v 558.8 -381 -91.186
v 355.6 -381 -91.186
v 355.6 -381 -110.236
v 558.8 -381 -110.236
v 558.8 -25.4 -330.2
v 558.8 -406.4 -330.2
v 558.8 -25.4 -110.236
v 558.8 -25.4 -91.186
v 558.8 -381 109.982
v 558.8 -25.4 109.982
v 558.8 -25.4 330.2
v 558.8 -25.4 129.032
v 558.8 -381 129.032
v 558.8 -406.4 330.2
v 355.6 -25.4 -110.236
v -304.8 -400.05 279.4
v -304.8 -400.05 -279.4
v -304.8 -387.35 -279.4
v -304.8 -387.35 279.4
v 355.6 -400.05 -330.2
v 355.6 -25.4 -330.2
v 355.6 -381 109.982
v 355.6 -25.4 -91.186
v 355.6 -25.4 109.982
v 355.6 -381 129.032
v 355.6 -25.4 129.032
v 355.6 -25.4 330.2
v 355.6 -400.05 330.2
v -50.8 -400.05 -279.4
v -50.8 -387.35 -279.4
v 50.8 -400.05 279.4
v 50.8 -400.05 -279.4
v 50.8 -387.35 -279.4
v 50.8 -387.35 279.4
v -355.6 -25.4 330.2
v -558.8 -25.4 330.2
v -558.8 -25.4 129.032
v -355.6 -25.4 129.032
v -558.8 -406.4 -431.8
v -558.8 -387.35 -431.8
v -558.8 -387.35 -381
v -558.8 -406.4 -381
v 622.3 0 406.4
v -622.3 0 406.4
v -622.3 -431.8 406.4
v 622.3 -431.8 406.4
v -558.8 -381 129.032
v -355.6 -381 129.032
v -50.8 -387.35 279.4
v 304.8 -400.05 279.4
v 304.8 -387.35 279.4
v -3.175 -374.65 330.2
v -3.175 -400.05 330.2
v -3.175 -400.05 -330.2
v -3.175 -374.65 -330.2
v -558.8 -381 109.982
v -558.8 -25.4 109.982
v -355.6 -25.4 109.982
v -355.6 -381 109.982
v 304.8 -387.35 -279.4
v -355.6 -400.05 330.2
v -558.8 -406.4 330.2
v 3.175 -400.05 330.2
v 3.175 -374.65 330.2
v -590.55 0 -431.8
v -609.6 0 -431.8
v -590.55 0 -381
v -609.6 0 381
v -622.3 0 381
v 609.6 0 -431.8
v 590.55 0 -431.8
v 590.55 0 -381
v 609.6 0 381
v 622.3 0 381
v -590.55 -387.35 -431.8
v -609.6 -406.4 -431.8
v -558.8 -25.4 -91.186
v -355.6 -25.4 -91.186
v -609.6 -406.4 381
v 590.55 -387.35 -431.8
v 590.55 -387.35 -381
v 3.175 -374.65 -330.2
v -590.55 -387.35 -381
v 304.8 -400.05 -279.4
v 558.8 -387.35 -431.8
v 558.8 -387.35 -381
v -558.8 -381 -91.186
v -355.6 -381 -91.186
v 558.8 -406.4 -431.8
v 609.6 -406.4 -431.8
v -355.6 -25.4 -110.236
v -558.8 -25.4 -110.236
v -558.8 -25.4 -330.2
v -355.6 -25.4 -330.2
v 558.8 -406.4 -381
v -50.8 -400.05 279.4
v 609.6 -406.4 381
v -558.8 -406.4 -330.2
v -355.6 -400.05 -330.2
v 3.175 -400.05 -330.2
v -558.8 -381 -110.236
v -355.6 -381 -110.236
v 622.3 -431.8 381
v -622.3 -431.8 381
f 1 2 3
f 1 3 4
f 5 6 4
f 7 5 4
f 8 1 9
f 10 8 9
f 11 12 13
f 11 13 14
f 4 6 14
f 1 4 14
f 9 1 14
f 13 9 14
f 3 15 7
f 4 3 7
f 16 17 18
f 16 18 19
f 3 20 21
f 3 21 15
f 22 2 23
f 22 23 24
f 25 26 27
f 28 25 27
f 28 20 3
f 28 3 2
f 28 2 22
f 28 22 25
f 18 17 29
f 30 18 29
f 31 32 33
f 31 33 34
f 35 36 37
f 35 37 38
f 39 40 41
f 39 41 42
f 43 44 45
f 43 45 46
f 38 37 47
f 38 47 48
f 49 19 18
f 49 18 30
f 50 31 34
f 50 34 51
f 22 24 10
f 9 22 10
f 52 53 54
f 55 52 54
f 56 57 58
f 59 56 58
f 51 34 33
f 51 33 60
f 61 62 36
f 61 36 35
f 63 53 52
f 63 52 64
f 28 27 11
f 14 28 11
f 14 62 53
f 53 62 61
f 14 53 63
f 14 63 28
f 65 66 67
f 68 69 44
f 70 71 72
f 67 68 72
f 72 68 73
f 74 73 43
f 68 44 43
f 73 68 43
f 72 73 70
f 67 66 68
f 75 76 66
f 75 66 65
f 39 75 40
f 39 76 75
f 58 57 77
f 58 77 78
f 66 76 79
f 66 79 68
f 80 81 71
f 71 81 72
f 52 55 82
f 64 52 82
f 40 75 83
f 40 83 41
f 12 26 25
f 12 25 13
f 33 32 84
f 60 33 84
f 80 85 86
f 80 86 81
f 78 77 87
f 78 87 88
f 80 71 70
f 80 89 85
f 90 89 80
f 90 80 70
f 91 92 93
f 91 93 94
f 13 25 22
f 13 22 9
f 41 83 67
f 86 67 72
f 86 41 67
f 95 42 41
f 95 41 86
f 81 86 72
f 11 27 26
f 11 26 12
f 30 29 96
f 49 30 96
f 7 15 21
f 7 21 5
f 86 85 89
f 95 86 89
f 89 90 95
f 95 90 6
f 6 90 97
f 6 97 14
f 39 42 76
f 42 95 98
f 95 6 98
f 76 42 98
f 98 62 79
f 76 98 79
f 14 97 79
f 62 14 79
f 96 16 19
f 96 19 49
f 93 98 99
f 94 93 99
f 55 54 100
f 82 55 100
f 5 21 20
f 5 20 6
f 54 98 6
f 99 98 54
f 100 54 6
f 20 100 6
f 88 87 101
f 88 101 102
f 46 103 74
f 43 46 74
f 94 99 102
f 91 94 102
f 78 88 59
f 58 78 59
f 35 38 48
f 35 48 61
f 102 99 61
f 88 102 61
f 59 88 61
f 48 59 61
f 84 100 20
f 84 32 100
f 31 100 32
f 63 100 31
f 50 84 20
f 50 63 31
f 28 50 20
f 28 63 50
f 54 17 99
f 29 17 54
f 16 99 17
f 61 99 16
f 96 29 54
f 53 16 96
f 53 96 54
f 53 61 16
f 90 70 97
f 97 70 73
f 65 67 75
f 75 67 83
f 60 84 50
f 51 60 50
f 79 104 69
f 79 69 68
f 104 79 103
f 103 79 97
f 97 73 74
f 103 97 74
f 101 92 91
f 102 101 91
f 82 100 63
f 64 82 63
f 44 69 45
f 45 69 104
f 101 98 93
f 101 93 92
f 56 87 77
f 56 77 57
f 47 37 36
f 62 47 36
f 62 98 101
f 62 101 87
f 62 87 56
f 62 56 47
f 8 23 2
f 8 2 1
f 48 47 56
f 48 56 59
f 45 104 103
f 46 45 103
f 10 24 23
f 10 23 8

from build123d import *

# Parameters (mm, degrees)
F0_W      = 1219.2
F0_H      = 762
F1_DEPTH  = 406.4
F2_W      = 38.1
F2_H      = 38.1
F3_DEPTH  = 50.8
F4_W      = 1219.2
F4_H      = 406.4
F5_DEPTH  = 25.4
F7_DEPTH  = 6.35
F6_W      = 203.2
F6_H      = 660.4
F8_DEPTH  = 381
F9_W      = 254
F9_H      = 558.8
F10_DEPTH = 12.7
F9_W_2    = 3.175
F11_DEPTH = 25.4
F12_W     = 203.2
F12_H     = 19.05
F13_DEPTH = 355.6
F14_DEPTH = 50.8
F15_W     = 19.05
F15_H     = 19.05
F15_H_2   = 387.35
F15_W_2   = 31.75
F16_DEPTH = 50.8


with BuildPart() as f1:
    # F0 (on Front) → F1 (new body)
    with BuildSketch(Plane.XZ):
        Rectangle(F0_W, F0_H)
    extrude(amount=F1_DEPTH)

    # F2 (on face) → F3 (join)
    with BuildSketch(Plane(origin=(0, 0, -381), x_dir=(1, 0, 0), z_dir=(0, 0, -1))):
        with Locations((-590.55, 387.35)):
            Rectangle(F2_W, F2_H)
        with Locations((-590.55, 19.05)):
            Rectangle(F2_W, F2_H)
        with Locations((590.55, 387.35)):
            Rectangle(F2_W, F2_H)
        with Locations((590.55, 19.05)):
            Rectangle(F2_W, F2_H)
    extrude(amount=F3_DEPTH)

    # F4 (on face) → F5 (join)
    with BuildSketch(Plane.XY.offset(381)):
        with Locations((0, -203.2)):
            Rectangle(F4_W, F4_H)
        Polygon((-609.6, -406.4), (-609.6, 0), (-622.3, 0), (-622.3, -406.4), (-622.3, -431.8), (622.3, -431.8), (622.3, 0), (609.6, 0), (609.6, -406.4), align=None)
    extrude(amount=F5_DEPTH)

    # F6 (on face) → F7 (cut)
    with BuildSketch(Plane.XZ.offset(406.4)):
        Polygon((-101.6, 330.2), (-355.6, 330.2), (-355.6, -330.2), (0, -330.2), (0, 0), (0, 330.2), align=None)
        Polygon((355.6, 330.2), (0, 330.2), (0, 0), (0, -330.2), (355.6, -330.2), align=None)
    extrude(amount=-F7_DEPTH, mode=Mode.SUBTRACT)

    # F6 (on face) → F8 (cut)
    with BuildSketch(Plane.XZ.offset(406.4)):
        with Locations((-457.2, 0)):
            Rectangle(F6_W, F6_H)
        with Locations((457.2, 0)):
            Rectangle(F6_W, F6_H)
    extrude(amount=-F8_DEPTH, mode=Mode.SUBTRACT)

    # F9 (on face) → F10 (cut)
    with BuildSketch(Plane.XZ.offset(400.05)):
        with Locations((-177.8, 0)):
            Rectangle(F9_W, F9_H)
        with Locations((177.8, 0)):
            Rectangle(F9_W, F9_H)
    extrude(amount=-F10_DEPTH, mode=Mode.SUBTRACT)

    # F9 (on face) → F11 (cut)
    with BuildSketch(Plane.XZ.offset(400.05)):
        with Locations((1.5875, 0)):
            Rectangle(F9_W_2, F9_H)
        with Locations((-1.5875, 0)):
            Rectangle(F9_W_2, F9_H)
        Polygon((-3.175, -279.4), (-3.175, -330.2), (3.175, -330.2), (3.175, -279.4), (0, -279.4), align=None)
        Polygon((-3.175, 330.2), (-3.175, 279.4), (0, 279.4), (3.175, 279.4), (3.175, 330.2), align=None)
    extrude(amount=-F11_DEPTH, mode=Mode.SUBTRACT)

    # F12 (on face) → F13 (join)
    with BuildSketch(Plane.XZ.offset(25.4)):
        with Locations((-457.2, 119.507)):
            Rectangle(F12_W, F12_H)
        with Locations((-457.2, -100.711)):
            Rectangle(F12_W, F12_H)
        with Locations((457.2, -100.711)):
            Rectangle(F12_W, F12_H)
        with Locations((457.2, 119.507)):
            Rectangle(F12_W, F12_H)
    extrude(amount=F13_DEPTH)

    # F14 (cut): faces of the model
    f14_faces = [f1.faces().sort_by_distance(p)[0] for p in [
        (-590.55, -387.35, -431.8),
        (590.55, -387.35, -431.8),
        (590.55, -19.05, -431.8),
        (-590.55, -19.05, -431.8),
    ]]
    extrude(f14_faces, amount=-F14_DEPTH, mode=Mode.SUBTRACT)

    # F15 (on face) → F16 (join)
    with BuildSketch(Plane(origin=(0, 0, -381), x_dir=(1, 0, 0), z_dir=(0, 0, -1))):
        with Locations((-600.075, 396.875)):
            Rectangle(F15_W, F15_H)
        with Locations((-600.075, 193.675)):
            Rectangle(F15_W, F15_H_2)
        with Locations((600.075, 193.675)):
            Rectangle(F15_W, F15_H_2)
        with Locations((600.075, 396.875)):
            Rectangle(F15_W, F15_H)
        with Locations((574.675, 396.875)):
            Rectangle(F15_W_2, F15_H)
        with Locations((-574.675, 396.875)):
            Rectangle(F15_W_2, F15_H)
    extrude(amount=F16_DEPTH)


solid = f1.part
